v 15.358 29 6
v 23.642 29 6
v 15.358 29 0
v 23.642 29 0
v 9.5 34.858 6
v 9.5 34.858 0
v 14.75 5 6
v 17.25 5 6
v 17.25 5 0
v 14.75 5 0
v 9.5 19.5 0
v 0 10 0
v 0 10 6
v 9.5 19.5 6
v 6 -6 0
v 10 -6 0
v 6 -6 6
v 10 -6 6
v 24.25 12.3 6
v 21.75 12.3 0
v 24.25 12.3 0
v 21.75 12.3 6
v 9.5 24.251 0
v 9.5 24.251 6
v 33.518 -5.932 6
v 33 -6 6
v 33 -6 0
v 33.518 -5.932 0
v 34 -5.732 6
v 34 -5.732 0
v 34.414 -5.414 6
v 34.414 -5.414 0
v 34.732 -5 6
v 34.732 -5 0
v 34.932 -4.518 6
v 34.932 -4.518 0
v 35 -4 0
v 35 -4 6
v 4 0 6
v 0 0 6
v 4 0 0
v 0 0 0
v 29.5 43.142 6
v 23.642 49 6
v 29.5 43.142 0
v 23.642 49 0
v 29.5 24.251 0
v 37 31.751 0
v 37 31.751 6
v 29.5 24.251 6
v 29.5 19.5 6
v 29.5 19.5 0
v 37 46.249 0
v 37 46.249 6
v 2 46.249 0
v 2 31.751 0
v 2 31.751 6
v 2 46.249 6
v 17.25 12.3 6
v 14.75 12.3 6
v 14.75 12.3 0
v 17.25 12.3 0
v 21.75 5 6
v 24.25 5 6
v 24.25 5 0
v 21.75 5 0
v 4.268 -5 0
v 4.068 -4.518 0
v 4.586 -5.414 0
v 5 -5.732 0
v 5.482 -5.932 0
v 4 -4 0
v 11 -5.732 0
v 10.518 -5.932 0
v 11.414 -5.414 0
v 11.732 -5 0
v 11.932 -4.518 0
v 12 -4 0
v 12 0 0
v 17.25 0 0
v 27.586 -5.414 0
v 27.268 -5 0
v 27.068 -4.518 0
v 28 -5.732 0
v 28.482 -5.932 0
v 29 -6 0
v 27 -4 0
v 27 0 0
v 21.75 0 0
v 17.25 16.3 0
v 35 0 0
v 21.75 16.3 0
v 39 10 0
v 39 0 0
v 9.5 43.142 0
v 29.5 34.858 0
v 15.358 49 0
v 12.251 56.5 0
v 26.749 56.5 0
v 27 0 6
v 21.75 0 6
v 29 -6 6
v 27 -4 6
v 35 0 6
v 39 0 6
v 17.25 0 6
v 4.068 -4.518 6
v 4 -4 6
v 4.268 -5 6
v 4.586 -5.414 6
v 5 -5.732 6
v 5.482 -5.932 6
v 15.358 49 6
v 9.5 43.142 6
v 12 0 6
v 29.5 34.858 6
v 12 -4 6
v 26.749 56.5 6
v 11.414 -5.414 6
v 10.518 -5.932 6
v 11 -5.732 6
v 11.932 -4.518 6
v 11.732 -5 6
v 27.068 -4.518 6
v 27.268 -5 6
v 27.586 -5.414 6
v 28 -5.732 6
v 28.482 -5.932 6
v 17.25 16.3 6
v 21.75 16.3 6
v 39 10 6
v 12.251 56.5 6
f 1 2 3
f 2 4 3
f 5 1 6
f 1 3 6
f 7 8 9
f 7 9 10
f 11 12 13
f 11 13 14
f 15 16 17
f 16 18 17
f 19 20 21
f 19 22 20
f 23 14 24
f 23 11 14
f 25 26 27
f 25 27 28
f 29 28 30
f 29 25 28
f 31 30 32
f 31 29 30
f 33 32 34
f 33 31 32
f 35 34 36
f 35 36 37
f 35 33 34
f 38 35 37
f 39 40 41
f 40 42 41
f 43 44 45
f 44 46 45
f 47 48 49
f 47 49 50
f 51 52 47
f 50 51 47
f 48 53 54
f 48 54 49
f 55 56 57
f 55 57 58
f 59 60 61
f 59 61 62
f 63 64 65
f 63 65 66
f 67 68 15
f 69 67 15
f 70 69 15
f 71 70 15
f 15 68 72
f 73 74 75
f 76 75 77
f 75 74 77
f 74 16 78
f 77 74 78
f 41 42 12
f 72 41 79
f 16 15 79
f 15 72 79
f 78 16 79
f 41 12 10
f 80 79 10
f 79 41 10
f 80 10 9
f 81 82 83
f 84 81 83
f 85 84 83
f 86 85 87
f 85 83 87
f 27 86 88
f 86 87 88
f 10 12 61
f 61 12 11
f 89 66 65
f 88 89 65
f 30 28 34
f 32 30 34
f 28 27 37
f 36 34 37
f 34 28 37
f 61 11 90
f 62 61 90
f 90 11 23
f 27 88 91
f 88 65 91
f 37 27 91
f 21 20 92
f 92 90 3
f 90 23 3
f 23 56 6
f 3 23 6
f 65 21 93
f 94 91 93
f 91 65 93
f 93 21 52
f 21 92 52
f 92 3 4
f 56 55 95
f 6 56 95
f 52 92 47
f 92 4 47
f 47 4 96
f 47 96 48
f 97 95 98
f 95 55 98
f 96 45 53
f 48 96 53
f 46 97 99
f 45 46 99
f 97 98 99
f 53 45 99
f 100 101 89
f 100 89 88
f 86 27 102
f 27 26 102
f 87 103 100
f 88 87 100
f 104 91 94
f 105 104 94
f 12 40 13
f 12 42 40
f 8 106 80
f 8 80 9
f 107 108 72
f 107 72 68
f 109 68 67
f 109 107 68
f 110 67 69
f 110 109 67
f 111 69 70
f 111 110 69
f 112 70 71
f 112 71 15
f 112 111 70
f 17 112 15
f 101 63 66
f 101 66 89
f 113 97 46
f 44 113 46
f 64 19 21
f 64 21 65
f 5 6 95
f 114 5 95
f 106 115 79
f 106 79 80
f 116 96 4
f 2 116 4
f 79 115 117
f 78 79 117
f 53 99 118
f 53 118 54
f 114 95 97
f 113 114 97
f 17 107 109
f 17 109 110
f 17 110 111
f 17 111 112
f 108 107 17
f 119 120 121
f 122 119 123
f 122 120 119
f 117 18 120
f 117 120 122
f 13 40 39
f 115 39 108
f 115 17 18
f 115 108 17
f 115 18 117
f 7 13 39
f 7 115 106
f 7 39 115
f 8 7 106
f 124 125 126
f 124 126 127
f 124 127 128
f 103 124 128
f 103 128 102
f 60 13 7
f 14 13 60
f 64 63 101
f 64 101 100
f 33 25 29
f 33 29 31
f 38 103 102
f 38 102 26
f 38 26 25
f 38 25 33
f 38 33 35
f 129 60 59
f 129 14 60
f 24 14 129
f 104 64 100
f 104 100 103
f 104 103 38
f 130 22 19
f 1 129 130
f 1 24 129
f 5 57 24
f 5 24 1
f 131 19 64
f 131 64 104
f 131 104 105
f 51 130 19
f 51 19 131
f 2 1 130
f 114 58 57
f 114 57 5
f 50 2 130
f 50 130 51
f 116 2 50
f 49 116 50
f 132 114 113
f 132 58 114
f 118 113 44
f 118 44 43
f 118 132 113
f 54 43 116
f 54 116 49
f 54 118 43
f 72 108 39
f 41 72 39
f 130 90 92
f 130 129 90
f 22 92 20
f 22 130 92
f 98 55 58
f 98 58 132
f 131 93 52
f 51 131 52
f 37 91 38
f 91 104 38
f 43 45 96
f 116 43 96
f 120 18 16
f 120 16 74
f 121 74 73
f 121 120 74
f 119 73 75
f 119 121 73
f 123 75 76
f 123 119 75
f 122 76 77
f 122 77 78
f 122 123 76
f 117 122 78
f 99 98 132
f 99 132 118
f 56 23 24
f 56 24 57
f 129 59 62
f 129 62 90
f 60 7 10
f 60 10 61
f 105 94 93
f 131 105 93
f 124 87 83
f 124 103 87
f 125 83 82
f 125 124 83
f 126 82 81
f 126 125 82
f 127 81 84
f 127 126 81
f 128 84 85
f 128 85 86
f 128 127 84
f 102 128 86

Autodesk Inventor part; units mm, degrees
ref_plane "YZ Plane" through (0, 0, 0) normal (1, 0, 0) x (0, 1, 0)
ref_plane "XZ Plane" through (0, 0, 0) normal (0, 1, 0) x (-1, 0, 0)
ref_plane "XY Plane" through (0, 0, 0) normal (0, 0, 1) x (1, 0, 0)
sketch "Sketch1" plane through (0, 0, 0) normal (0, 0, 1) x (1, 0, 0)
  line L0 (0, 0) -> (39, 0)
  line L1 (0, 0) -> (0, 10)
  line L2 (39, 0) -> (39, 10)
  line L3 (0, 10) -> (9.5, 19.5)
  line L4 (39, 10) -> (29.5, 19.5)
  line L5 (9.5, 24.2513) -> (2, 31.7513)
  line L6 (2, 31.7513) -> (2, 46.2487)
  line L7 (2, 46.2487) -> (12.2513, 56.5)
  line L8 (12.2513, 56.5) -> (26.7487, 56.5)
  line L9 (26.7487, 56.5) -> (37, 46.2487)
  line L10 (37, 46.2487) -> (37, 31.7513)
  line L11 (37, 31.7513) -> (29.5, 24.2513)
  line L12 (23.6421, 29) -> (15.3579, 29)
  line L13 (15.3579, 29) -> (9.5, 34.8579)
  line L14 (9.5, 34.8579) -> (9.5, 43.1421)
  line L15 (9.5, 43.1421) -> (15.3579, 49)
  line L16 (15.3579, 49) -> (23.6421, 49)
  line L17 (23.6421, 49) -> (29.5, 43.1421)
  line L18 (29.5, 43.1421) -> (29.5, 34.8579)
  line L19 (29.5, 34.8579) -> (23.6421, 29)
  line L20 (9.5, 19.5) -> (9.5, 24.2513)
  line L21 (29.5, 19.5) -> (29.5, 24.2513)
  point P0 (19.5, 39)
  point P1 (19.5, 39)
  point P2 (19.5, 0)
  dimension "d0" = 39
  dimension "d1" = 45
  dimension "d2" = 39
  dimension "d3" = 20
  dimension "d4" = 35
  dimension "d5" = 10
  dimension "d6" = 20
extrude "Extrusion1" add sketch "Sketch1" along normal blind 6
sketch "Sketch2" plane through (0, 0, 6) normal (0, 0, 1) x (1, 0, 0)
  line L0 (0, 0) -> (39, 0) projected
  line L1 (17.25, 16.3) -> (21.75, 16.3)
  line L2 (21.75, 0) -> (17.25, 0)
  line L3 (24.25, 12.3) -> (24.25, 5)
  line L4 (14.75, 5) -> (14.75, 12.3)
  line L5 (21.75, 16.3) -> (21.75, 12.3)
  line L6 (21.75, 5) -> (21.75, 0)
  line L7 (17.25, 0) -> (17.25, 5)
  line L8 (17.25, 12.3) -> (17.25, 16.3)
  line L9 (14.75, 12.3) -> (17.25, 12.3)
  line L10 (21.75, 12.3) -> (24.25, 12.3)
  line L11 (24.25, 5) -> (21.75, 5)
  line L12 (17.25, 5) -> (14.75, 5)
  point P0 (19.5, 16.3)
  point P1 (19.5, 0)
  dimension "d9" = 5
  dimension "d10" = 4
  dimension "d11" = 7.3
  dimension "d12" = 2.5
  dimension "d13" = 2.5
  dimension "d14" = 4.5
extrude "Extrusion2" cut sketch "Sketch2" against normal blind 6
sketch "Sketch3" plane through (0, 0, 6) normal (0, 0, 1) x (1, 0, 0)
  line L0 (21.75, 0) -> (39, 0) projected
  line L1 (0, 0) -> (17.25, 0) projected
  line L2 (17.25, 16.3) -> (21.75, 16.3) projected
  line L3 (4, 0) -> (12, 0)
  line L4 (12, 0) -> (12, -4)
  line L5 (10, -6) -> (6, -6)
  line L6 (4, -4) -> (4, 0)
  line L7 (27, 0) -> (35, 0)
  line L8 (35, 0) -> (35, -4)
  line L9 (33, -6) -> (29, -6)
  line L10 (27, -4) -> (27, 0)
  arc A0 (4, -4) -> (6, -6) centre (6, -4) ccw
  arc A1 (10, -6) -> (12, -4) centre (10, -4) ccw
  arc A2 (27, -4) -> (29, -6) centre (29, -4) ccw
  arc A3 (33, -6) -> (35, -4) centre (33, -4) ccw
  point P0 (19.5, 16.3)
  dimension "d17" = 2
  dimension "d18" = 8
  dimension "d19" = 8
  dimension "d20" = 6
  dimension "d21" = 7.5
  dimension "d22" = 15
extrude "Extrusion3" add sketch "Sketch3" against normal blind 6
properties part number "filament_guide"
